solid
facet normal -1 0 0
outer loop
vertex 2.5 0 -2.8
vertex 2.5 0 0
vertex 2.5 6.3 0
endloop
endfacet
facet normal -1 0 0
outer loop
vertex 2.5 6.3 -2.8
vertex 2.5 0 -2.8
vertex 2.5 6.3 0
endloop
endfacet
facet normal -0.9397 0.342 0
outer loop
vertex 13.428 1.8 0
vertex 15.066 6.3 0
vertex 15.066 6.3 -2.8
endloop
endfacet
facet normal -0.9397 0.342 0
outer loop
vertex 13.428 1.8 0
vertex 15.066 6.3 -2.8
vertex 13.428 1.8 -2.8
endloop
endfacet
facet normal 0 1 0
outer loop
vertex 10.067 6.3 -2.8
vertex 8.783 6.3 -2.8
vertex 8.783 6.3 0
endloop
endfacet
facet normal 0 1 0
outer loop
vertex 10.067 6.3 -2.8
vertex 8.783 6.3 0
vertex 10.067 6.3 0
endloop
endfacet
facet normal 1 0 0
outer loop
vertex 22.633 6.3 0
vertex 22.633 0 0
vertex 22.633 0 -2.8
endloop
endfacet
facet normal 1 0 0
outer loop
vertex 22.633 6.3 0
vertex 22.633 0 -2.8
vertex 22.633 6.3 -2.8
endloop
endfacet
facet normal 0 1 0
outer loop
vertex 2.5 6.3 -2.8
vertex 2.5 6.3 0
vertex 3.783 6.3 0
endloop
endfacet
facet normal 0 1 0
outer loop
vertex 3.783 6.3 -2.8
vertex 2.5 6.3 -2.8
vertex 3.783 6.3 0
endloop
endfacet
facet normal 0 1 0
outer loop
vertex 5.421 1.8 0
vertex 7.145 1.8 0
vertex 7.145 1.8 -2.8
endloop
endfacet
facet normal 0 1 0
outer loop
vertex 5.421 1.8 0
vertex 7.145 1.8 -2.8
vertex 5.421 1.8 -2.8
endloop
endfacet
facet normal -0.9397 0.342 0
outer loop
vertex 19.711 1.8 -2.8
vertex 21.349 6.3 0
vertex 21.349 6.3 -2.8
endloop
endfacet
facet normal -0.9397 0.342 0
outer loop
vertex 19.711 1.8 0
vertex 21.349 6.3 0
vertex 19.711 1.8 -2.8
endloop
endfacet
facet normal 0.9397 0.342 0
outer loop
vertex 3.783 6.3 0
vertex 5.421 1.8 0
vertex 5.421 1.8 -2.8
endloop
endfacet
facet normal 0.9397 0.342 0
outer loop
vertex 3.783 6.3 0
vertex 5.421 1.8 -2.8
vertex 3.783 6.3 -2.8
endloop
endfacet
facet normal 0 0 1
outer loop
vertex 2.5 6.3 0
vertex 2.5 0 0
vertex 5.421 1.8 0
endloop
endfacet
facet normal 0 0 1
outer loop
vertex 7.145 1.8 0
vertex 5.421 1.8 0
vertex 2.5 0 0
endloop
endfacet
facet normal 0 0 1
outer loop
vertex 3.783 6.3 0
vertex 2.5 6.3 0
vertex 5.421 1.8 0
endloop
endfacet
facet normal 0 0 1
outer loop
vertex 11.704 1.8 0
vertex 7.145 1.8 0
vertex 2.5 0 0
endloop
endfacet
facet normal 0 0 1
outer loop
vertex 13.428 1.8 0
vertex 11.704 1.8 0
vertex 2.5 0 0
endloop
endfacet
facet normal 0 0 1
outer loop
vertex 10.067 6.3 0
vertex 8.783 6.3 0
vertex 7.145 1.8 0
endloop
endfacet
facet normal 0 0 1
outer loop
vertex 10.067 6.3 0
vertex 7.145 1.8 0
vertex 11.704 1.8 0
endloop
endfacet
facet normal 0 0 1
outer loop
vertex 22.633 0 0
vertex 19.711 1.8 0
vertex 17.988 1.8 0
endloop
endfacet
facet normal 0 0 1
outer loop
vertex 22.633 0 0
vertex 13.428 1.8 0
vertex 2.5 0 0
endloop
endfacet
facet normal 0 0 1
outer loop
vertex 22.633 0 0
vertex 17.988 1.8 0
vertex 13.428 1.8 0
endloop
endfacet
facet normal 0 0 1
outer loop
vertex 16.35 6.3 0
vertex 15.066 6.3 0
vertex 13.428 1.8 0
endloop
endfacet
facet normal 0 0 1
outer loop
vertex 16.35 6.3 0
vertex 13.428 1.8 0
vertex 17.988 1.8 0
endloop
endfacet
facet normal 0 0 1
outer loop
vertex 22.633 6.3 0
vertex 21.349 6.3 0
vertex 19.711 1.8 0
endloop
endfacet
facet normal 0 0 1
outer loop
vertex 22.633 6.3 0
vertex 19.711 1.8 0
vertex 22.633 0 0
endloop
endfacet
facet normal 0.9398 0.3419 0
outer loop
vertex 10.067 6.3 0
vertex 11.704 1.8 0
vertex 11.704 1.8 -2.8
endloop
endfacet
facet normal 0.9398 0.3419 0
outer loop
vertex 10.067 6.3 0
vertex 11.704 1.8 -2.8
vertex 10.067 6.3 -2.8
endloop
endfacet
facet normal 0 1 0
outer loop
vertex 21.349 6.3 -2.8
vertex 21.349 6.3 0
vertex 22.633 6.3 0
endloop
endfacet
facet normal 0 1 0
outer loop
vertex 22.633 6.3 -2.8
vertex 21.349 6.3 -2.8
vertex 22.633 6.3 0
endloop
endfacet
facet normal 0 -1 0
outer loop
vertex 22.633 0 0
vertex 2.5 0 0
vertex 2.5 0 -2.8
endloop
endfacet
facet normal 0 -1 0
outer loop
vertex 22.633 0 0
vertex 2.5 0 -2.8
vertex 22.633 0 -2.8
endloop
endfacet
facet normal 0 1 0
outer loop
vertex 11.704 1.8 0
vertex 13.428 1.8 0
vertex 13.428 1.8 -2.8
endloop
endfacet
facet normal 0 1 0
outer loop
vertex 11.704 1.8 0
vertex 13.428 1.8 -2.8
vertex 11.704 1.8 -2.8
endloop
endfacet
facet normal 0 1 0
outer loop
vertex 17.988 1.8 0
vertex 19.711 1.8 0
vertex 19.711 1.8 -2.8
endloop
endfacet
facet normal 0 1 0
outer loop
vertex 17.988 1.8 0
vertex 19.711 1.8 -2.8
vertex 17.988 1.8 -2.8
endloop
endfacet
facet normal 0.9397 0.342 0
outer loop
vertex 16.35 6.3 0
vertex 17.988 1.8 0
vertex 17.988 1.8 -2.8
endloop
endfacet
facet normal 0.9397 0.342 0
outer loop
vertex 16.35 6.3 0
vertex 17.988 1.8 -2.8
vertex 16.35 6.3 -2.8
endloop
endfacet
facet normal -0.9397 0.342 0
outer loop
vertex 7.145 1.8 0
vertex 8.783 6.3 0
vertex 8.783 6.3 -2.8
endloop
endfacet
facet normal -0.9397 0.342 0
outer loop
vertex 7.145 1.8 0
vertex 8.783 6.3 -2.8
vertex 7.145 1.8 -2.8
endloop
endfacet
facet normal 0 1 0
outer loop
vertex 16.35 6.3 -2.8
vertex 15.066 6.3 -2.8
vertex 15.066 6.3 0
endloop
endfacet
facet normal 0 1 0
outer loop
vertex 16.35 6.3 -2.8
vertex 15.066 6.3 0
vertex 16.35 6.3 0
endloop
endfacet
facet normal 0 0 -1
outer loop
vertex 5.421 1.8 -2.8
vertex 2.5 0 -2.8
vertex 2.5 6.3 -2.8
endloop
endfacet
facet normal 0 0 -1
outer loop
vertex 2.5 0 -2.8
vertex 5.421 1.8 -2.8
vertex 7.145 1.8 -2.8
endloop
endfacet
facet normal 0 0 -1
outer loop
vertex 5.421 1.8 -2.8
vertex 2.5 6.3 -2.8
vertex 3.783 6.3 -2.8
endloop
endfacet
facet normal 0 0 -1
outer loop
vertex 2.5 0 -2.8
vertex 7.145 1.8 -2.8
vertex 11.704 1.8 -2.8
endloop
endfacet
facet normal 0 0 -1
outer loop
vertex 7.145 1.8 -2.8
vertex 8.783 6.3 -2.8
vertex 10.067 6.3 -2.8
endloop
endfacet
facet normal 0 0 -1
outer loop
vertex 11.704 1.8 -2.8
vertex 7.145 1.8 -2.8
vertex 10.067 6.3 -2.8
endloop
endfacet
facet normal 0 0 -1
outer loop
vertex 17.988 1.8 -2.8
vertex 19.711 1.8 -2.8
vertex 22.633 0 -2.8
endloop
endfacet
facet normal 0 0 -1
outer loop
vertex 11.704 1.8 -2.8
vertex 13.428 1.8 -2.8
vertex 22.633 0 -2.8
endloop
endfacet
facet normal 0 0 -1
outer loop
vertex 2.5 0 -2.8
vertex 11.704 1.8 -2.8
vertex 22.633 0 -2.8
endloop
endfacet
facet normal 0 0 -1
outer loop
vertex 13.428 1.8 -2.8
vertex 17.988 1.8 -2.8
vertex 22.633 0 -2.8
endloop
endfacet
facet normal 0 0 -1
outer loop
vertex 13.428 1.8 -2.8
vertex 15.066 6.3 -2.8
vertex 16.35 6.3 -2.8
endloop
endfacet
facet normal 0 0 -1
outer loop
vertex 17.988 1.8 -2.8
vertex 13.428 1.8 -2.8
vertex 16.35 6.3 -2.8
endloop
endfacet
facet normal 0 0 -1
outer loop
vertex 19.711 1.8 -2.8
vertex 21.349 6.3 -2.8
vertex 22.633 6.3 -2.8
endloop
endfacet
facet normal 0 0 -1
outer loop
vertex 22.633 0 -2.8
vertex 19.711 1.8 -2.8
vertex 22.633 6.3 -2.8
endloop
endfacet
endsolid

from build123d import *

# Parameters (mm, degrees)
BLANKSKE_W          = 24
BLANKSKE_H          = 6.3
BLANK_DEPTH         = 2.8
TOOTHCUTSIM_DEPTH   = 25.970582692
TEETHCUTS_COUNT     = 5
TEETHCUTS_PITCH     = 6.2831853
SKETCH_1_W          = 1.366995594
SKETCH_1_H          = 6.3
SKETCH_1_W_2        = 2.499736794
CUT_EXTRUDE_1_DEPTH = 25.970582692


with BuildPart() as part:
    # BlankSke → Blank (new body)
    with BuildSketch(Plane.XY):
        with Locations((12, 3.15)):
            Rectangle(BLANKSKE_W, BLANKSKE_H)
    extrude(amount=-BLANK_DEPTH)

    # TooCutSkeSim → ToothCutSim (cut, through all)
    with BuildSketch(Plane.XY):
        Polygon((0.861870739, 1.8), (-0.861870739, 1.8), (-2.508981637, 6.3254), (2.508981637, 6.3254), align=None)
    toothcutsim = extrude(amount=-TOOTHCUTSIM_DEPTH, mode=Mode.SUBTRACT)

    # TeethCuts: ToothCutSim ×5
    with Locations(*[(i * TEETHCUTS_PITCH, 0, 0) for i in range(1, TEETHCUTS_COUNT)]):
        add(toothcutsim, mode=Mode.SUBTRACT)

    # ｽｹｯﾁ1 → ｶｯﾄ - 押し出し1 (cut, through all)
    with BuildSketch(Plane.XY):
        with Locations((23.316502203, 3.15)):
            Rectangle(SKETCH_1_W, SKETCH_1_H)
        with Locations((1.249868397, 3.15)):
            Rectangle(SKETCH_1_W_2, SKETCH_1_H)
    extrude(amount=-CUT_EXTRUDE_1_DEPTH, mode=Mode.SUBTRACT)


solid = part.part
